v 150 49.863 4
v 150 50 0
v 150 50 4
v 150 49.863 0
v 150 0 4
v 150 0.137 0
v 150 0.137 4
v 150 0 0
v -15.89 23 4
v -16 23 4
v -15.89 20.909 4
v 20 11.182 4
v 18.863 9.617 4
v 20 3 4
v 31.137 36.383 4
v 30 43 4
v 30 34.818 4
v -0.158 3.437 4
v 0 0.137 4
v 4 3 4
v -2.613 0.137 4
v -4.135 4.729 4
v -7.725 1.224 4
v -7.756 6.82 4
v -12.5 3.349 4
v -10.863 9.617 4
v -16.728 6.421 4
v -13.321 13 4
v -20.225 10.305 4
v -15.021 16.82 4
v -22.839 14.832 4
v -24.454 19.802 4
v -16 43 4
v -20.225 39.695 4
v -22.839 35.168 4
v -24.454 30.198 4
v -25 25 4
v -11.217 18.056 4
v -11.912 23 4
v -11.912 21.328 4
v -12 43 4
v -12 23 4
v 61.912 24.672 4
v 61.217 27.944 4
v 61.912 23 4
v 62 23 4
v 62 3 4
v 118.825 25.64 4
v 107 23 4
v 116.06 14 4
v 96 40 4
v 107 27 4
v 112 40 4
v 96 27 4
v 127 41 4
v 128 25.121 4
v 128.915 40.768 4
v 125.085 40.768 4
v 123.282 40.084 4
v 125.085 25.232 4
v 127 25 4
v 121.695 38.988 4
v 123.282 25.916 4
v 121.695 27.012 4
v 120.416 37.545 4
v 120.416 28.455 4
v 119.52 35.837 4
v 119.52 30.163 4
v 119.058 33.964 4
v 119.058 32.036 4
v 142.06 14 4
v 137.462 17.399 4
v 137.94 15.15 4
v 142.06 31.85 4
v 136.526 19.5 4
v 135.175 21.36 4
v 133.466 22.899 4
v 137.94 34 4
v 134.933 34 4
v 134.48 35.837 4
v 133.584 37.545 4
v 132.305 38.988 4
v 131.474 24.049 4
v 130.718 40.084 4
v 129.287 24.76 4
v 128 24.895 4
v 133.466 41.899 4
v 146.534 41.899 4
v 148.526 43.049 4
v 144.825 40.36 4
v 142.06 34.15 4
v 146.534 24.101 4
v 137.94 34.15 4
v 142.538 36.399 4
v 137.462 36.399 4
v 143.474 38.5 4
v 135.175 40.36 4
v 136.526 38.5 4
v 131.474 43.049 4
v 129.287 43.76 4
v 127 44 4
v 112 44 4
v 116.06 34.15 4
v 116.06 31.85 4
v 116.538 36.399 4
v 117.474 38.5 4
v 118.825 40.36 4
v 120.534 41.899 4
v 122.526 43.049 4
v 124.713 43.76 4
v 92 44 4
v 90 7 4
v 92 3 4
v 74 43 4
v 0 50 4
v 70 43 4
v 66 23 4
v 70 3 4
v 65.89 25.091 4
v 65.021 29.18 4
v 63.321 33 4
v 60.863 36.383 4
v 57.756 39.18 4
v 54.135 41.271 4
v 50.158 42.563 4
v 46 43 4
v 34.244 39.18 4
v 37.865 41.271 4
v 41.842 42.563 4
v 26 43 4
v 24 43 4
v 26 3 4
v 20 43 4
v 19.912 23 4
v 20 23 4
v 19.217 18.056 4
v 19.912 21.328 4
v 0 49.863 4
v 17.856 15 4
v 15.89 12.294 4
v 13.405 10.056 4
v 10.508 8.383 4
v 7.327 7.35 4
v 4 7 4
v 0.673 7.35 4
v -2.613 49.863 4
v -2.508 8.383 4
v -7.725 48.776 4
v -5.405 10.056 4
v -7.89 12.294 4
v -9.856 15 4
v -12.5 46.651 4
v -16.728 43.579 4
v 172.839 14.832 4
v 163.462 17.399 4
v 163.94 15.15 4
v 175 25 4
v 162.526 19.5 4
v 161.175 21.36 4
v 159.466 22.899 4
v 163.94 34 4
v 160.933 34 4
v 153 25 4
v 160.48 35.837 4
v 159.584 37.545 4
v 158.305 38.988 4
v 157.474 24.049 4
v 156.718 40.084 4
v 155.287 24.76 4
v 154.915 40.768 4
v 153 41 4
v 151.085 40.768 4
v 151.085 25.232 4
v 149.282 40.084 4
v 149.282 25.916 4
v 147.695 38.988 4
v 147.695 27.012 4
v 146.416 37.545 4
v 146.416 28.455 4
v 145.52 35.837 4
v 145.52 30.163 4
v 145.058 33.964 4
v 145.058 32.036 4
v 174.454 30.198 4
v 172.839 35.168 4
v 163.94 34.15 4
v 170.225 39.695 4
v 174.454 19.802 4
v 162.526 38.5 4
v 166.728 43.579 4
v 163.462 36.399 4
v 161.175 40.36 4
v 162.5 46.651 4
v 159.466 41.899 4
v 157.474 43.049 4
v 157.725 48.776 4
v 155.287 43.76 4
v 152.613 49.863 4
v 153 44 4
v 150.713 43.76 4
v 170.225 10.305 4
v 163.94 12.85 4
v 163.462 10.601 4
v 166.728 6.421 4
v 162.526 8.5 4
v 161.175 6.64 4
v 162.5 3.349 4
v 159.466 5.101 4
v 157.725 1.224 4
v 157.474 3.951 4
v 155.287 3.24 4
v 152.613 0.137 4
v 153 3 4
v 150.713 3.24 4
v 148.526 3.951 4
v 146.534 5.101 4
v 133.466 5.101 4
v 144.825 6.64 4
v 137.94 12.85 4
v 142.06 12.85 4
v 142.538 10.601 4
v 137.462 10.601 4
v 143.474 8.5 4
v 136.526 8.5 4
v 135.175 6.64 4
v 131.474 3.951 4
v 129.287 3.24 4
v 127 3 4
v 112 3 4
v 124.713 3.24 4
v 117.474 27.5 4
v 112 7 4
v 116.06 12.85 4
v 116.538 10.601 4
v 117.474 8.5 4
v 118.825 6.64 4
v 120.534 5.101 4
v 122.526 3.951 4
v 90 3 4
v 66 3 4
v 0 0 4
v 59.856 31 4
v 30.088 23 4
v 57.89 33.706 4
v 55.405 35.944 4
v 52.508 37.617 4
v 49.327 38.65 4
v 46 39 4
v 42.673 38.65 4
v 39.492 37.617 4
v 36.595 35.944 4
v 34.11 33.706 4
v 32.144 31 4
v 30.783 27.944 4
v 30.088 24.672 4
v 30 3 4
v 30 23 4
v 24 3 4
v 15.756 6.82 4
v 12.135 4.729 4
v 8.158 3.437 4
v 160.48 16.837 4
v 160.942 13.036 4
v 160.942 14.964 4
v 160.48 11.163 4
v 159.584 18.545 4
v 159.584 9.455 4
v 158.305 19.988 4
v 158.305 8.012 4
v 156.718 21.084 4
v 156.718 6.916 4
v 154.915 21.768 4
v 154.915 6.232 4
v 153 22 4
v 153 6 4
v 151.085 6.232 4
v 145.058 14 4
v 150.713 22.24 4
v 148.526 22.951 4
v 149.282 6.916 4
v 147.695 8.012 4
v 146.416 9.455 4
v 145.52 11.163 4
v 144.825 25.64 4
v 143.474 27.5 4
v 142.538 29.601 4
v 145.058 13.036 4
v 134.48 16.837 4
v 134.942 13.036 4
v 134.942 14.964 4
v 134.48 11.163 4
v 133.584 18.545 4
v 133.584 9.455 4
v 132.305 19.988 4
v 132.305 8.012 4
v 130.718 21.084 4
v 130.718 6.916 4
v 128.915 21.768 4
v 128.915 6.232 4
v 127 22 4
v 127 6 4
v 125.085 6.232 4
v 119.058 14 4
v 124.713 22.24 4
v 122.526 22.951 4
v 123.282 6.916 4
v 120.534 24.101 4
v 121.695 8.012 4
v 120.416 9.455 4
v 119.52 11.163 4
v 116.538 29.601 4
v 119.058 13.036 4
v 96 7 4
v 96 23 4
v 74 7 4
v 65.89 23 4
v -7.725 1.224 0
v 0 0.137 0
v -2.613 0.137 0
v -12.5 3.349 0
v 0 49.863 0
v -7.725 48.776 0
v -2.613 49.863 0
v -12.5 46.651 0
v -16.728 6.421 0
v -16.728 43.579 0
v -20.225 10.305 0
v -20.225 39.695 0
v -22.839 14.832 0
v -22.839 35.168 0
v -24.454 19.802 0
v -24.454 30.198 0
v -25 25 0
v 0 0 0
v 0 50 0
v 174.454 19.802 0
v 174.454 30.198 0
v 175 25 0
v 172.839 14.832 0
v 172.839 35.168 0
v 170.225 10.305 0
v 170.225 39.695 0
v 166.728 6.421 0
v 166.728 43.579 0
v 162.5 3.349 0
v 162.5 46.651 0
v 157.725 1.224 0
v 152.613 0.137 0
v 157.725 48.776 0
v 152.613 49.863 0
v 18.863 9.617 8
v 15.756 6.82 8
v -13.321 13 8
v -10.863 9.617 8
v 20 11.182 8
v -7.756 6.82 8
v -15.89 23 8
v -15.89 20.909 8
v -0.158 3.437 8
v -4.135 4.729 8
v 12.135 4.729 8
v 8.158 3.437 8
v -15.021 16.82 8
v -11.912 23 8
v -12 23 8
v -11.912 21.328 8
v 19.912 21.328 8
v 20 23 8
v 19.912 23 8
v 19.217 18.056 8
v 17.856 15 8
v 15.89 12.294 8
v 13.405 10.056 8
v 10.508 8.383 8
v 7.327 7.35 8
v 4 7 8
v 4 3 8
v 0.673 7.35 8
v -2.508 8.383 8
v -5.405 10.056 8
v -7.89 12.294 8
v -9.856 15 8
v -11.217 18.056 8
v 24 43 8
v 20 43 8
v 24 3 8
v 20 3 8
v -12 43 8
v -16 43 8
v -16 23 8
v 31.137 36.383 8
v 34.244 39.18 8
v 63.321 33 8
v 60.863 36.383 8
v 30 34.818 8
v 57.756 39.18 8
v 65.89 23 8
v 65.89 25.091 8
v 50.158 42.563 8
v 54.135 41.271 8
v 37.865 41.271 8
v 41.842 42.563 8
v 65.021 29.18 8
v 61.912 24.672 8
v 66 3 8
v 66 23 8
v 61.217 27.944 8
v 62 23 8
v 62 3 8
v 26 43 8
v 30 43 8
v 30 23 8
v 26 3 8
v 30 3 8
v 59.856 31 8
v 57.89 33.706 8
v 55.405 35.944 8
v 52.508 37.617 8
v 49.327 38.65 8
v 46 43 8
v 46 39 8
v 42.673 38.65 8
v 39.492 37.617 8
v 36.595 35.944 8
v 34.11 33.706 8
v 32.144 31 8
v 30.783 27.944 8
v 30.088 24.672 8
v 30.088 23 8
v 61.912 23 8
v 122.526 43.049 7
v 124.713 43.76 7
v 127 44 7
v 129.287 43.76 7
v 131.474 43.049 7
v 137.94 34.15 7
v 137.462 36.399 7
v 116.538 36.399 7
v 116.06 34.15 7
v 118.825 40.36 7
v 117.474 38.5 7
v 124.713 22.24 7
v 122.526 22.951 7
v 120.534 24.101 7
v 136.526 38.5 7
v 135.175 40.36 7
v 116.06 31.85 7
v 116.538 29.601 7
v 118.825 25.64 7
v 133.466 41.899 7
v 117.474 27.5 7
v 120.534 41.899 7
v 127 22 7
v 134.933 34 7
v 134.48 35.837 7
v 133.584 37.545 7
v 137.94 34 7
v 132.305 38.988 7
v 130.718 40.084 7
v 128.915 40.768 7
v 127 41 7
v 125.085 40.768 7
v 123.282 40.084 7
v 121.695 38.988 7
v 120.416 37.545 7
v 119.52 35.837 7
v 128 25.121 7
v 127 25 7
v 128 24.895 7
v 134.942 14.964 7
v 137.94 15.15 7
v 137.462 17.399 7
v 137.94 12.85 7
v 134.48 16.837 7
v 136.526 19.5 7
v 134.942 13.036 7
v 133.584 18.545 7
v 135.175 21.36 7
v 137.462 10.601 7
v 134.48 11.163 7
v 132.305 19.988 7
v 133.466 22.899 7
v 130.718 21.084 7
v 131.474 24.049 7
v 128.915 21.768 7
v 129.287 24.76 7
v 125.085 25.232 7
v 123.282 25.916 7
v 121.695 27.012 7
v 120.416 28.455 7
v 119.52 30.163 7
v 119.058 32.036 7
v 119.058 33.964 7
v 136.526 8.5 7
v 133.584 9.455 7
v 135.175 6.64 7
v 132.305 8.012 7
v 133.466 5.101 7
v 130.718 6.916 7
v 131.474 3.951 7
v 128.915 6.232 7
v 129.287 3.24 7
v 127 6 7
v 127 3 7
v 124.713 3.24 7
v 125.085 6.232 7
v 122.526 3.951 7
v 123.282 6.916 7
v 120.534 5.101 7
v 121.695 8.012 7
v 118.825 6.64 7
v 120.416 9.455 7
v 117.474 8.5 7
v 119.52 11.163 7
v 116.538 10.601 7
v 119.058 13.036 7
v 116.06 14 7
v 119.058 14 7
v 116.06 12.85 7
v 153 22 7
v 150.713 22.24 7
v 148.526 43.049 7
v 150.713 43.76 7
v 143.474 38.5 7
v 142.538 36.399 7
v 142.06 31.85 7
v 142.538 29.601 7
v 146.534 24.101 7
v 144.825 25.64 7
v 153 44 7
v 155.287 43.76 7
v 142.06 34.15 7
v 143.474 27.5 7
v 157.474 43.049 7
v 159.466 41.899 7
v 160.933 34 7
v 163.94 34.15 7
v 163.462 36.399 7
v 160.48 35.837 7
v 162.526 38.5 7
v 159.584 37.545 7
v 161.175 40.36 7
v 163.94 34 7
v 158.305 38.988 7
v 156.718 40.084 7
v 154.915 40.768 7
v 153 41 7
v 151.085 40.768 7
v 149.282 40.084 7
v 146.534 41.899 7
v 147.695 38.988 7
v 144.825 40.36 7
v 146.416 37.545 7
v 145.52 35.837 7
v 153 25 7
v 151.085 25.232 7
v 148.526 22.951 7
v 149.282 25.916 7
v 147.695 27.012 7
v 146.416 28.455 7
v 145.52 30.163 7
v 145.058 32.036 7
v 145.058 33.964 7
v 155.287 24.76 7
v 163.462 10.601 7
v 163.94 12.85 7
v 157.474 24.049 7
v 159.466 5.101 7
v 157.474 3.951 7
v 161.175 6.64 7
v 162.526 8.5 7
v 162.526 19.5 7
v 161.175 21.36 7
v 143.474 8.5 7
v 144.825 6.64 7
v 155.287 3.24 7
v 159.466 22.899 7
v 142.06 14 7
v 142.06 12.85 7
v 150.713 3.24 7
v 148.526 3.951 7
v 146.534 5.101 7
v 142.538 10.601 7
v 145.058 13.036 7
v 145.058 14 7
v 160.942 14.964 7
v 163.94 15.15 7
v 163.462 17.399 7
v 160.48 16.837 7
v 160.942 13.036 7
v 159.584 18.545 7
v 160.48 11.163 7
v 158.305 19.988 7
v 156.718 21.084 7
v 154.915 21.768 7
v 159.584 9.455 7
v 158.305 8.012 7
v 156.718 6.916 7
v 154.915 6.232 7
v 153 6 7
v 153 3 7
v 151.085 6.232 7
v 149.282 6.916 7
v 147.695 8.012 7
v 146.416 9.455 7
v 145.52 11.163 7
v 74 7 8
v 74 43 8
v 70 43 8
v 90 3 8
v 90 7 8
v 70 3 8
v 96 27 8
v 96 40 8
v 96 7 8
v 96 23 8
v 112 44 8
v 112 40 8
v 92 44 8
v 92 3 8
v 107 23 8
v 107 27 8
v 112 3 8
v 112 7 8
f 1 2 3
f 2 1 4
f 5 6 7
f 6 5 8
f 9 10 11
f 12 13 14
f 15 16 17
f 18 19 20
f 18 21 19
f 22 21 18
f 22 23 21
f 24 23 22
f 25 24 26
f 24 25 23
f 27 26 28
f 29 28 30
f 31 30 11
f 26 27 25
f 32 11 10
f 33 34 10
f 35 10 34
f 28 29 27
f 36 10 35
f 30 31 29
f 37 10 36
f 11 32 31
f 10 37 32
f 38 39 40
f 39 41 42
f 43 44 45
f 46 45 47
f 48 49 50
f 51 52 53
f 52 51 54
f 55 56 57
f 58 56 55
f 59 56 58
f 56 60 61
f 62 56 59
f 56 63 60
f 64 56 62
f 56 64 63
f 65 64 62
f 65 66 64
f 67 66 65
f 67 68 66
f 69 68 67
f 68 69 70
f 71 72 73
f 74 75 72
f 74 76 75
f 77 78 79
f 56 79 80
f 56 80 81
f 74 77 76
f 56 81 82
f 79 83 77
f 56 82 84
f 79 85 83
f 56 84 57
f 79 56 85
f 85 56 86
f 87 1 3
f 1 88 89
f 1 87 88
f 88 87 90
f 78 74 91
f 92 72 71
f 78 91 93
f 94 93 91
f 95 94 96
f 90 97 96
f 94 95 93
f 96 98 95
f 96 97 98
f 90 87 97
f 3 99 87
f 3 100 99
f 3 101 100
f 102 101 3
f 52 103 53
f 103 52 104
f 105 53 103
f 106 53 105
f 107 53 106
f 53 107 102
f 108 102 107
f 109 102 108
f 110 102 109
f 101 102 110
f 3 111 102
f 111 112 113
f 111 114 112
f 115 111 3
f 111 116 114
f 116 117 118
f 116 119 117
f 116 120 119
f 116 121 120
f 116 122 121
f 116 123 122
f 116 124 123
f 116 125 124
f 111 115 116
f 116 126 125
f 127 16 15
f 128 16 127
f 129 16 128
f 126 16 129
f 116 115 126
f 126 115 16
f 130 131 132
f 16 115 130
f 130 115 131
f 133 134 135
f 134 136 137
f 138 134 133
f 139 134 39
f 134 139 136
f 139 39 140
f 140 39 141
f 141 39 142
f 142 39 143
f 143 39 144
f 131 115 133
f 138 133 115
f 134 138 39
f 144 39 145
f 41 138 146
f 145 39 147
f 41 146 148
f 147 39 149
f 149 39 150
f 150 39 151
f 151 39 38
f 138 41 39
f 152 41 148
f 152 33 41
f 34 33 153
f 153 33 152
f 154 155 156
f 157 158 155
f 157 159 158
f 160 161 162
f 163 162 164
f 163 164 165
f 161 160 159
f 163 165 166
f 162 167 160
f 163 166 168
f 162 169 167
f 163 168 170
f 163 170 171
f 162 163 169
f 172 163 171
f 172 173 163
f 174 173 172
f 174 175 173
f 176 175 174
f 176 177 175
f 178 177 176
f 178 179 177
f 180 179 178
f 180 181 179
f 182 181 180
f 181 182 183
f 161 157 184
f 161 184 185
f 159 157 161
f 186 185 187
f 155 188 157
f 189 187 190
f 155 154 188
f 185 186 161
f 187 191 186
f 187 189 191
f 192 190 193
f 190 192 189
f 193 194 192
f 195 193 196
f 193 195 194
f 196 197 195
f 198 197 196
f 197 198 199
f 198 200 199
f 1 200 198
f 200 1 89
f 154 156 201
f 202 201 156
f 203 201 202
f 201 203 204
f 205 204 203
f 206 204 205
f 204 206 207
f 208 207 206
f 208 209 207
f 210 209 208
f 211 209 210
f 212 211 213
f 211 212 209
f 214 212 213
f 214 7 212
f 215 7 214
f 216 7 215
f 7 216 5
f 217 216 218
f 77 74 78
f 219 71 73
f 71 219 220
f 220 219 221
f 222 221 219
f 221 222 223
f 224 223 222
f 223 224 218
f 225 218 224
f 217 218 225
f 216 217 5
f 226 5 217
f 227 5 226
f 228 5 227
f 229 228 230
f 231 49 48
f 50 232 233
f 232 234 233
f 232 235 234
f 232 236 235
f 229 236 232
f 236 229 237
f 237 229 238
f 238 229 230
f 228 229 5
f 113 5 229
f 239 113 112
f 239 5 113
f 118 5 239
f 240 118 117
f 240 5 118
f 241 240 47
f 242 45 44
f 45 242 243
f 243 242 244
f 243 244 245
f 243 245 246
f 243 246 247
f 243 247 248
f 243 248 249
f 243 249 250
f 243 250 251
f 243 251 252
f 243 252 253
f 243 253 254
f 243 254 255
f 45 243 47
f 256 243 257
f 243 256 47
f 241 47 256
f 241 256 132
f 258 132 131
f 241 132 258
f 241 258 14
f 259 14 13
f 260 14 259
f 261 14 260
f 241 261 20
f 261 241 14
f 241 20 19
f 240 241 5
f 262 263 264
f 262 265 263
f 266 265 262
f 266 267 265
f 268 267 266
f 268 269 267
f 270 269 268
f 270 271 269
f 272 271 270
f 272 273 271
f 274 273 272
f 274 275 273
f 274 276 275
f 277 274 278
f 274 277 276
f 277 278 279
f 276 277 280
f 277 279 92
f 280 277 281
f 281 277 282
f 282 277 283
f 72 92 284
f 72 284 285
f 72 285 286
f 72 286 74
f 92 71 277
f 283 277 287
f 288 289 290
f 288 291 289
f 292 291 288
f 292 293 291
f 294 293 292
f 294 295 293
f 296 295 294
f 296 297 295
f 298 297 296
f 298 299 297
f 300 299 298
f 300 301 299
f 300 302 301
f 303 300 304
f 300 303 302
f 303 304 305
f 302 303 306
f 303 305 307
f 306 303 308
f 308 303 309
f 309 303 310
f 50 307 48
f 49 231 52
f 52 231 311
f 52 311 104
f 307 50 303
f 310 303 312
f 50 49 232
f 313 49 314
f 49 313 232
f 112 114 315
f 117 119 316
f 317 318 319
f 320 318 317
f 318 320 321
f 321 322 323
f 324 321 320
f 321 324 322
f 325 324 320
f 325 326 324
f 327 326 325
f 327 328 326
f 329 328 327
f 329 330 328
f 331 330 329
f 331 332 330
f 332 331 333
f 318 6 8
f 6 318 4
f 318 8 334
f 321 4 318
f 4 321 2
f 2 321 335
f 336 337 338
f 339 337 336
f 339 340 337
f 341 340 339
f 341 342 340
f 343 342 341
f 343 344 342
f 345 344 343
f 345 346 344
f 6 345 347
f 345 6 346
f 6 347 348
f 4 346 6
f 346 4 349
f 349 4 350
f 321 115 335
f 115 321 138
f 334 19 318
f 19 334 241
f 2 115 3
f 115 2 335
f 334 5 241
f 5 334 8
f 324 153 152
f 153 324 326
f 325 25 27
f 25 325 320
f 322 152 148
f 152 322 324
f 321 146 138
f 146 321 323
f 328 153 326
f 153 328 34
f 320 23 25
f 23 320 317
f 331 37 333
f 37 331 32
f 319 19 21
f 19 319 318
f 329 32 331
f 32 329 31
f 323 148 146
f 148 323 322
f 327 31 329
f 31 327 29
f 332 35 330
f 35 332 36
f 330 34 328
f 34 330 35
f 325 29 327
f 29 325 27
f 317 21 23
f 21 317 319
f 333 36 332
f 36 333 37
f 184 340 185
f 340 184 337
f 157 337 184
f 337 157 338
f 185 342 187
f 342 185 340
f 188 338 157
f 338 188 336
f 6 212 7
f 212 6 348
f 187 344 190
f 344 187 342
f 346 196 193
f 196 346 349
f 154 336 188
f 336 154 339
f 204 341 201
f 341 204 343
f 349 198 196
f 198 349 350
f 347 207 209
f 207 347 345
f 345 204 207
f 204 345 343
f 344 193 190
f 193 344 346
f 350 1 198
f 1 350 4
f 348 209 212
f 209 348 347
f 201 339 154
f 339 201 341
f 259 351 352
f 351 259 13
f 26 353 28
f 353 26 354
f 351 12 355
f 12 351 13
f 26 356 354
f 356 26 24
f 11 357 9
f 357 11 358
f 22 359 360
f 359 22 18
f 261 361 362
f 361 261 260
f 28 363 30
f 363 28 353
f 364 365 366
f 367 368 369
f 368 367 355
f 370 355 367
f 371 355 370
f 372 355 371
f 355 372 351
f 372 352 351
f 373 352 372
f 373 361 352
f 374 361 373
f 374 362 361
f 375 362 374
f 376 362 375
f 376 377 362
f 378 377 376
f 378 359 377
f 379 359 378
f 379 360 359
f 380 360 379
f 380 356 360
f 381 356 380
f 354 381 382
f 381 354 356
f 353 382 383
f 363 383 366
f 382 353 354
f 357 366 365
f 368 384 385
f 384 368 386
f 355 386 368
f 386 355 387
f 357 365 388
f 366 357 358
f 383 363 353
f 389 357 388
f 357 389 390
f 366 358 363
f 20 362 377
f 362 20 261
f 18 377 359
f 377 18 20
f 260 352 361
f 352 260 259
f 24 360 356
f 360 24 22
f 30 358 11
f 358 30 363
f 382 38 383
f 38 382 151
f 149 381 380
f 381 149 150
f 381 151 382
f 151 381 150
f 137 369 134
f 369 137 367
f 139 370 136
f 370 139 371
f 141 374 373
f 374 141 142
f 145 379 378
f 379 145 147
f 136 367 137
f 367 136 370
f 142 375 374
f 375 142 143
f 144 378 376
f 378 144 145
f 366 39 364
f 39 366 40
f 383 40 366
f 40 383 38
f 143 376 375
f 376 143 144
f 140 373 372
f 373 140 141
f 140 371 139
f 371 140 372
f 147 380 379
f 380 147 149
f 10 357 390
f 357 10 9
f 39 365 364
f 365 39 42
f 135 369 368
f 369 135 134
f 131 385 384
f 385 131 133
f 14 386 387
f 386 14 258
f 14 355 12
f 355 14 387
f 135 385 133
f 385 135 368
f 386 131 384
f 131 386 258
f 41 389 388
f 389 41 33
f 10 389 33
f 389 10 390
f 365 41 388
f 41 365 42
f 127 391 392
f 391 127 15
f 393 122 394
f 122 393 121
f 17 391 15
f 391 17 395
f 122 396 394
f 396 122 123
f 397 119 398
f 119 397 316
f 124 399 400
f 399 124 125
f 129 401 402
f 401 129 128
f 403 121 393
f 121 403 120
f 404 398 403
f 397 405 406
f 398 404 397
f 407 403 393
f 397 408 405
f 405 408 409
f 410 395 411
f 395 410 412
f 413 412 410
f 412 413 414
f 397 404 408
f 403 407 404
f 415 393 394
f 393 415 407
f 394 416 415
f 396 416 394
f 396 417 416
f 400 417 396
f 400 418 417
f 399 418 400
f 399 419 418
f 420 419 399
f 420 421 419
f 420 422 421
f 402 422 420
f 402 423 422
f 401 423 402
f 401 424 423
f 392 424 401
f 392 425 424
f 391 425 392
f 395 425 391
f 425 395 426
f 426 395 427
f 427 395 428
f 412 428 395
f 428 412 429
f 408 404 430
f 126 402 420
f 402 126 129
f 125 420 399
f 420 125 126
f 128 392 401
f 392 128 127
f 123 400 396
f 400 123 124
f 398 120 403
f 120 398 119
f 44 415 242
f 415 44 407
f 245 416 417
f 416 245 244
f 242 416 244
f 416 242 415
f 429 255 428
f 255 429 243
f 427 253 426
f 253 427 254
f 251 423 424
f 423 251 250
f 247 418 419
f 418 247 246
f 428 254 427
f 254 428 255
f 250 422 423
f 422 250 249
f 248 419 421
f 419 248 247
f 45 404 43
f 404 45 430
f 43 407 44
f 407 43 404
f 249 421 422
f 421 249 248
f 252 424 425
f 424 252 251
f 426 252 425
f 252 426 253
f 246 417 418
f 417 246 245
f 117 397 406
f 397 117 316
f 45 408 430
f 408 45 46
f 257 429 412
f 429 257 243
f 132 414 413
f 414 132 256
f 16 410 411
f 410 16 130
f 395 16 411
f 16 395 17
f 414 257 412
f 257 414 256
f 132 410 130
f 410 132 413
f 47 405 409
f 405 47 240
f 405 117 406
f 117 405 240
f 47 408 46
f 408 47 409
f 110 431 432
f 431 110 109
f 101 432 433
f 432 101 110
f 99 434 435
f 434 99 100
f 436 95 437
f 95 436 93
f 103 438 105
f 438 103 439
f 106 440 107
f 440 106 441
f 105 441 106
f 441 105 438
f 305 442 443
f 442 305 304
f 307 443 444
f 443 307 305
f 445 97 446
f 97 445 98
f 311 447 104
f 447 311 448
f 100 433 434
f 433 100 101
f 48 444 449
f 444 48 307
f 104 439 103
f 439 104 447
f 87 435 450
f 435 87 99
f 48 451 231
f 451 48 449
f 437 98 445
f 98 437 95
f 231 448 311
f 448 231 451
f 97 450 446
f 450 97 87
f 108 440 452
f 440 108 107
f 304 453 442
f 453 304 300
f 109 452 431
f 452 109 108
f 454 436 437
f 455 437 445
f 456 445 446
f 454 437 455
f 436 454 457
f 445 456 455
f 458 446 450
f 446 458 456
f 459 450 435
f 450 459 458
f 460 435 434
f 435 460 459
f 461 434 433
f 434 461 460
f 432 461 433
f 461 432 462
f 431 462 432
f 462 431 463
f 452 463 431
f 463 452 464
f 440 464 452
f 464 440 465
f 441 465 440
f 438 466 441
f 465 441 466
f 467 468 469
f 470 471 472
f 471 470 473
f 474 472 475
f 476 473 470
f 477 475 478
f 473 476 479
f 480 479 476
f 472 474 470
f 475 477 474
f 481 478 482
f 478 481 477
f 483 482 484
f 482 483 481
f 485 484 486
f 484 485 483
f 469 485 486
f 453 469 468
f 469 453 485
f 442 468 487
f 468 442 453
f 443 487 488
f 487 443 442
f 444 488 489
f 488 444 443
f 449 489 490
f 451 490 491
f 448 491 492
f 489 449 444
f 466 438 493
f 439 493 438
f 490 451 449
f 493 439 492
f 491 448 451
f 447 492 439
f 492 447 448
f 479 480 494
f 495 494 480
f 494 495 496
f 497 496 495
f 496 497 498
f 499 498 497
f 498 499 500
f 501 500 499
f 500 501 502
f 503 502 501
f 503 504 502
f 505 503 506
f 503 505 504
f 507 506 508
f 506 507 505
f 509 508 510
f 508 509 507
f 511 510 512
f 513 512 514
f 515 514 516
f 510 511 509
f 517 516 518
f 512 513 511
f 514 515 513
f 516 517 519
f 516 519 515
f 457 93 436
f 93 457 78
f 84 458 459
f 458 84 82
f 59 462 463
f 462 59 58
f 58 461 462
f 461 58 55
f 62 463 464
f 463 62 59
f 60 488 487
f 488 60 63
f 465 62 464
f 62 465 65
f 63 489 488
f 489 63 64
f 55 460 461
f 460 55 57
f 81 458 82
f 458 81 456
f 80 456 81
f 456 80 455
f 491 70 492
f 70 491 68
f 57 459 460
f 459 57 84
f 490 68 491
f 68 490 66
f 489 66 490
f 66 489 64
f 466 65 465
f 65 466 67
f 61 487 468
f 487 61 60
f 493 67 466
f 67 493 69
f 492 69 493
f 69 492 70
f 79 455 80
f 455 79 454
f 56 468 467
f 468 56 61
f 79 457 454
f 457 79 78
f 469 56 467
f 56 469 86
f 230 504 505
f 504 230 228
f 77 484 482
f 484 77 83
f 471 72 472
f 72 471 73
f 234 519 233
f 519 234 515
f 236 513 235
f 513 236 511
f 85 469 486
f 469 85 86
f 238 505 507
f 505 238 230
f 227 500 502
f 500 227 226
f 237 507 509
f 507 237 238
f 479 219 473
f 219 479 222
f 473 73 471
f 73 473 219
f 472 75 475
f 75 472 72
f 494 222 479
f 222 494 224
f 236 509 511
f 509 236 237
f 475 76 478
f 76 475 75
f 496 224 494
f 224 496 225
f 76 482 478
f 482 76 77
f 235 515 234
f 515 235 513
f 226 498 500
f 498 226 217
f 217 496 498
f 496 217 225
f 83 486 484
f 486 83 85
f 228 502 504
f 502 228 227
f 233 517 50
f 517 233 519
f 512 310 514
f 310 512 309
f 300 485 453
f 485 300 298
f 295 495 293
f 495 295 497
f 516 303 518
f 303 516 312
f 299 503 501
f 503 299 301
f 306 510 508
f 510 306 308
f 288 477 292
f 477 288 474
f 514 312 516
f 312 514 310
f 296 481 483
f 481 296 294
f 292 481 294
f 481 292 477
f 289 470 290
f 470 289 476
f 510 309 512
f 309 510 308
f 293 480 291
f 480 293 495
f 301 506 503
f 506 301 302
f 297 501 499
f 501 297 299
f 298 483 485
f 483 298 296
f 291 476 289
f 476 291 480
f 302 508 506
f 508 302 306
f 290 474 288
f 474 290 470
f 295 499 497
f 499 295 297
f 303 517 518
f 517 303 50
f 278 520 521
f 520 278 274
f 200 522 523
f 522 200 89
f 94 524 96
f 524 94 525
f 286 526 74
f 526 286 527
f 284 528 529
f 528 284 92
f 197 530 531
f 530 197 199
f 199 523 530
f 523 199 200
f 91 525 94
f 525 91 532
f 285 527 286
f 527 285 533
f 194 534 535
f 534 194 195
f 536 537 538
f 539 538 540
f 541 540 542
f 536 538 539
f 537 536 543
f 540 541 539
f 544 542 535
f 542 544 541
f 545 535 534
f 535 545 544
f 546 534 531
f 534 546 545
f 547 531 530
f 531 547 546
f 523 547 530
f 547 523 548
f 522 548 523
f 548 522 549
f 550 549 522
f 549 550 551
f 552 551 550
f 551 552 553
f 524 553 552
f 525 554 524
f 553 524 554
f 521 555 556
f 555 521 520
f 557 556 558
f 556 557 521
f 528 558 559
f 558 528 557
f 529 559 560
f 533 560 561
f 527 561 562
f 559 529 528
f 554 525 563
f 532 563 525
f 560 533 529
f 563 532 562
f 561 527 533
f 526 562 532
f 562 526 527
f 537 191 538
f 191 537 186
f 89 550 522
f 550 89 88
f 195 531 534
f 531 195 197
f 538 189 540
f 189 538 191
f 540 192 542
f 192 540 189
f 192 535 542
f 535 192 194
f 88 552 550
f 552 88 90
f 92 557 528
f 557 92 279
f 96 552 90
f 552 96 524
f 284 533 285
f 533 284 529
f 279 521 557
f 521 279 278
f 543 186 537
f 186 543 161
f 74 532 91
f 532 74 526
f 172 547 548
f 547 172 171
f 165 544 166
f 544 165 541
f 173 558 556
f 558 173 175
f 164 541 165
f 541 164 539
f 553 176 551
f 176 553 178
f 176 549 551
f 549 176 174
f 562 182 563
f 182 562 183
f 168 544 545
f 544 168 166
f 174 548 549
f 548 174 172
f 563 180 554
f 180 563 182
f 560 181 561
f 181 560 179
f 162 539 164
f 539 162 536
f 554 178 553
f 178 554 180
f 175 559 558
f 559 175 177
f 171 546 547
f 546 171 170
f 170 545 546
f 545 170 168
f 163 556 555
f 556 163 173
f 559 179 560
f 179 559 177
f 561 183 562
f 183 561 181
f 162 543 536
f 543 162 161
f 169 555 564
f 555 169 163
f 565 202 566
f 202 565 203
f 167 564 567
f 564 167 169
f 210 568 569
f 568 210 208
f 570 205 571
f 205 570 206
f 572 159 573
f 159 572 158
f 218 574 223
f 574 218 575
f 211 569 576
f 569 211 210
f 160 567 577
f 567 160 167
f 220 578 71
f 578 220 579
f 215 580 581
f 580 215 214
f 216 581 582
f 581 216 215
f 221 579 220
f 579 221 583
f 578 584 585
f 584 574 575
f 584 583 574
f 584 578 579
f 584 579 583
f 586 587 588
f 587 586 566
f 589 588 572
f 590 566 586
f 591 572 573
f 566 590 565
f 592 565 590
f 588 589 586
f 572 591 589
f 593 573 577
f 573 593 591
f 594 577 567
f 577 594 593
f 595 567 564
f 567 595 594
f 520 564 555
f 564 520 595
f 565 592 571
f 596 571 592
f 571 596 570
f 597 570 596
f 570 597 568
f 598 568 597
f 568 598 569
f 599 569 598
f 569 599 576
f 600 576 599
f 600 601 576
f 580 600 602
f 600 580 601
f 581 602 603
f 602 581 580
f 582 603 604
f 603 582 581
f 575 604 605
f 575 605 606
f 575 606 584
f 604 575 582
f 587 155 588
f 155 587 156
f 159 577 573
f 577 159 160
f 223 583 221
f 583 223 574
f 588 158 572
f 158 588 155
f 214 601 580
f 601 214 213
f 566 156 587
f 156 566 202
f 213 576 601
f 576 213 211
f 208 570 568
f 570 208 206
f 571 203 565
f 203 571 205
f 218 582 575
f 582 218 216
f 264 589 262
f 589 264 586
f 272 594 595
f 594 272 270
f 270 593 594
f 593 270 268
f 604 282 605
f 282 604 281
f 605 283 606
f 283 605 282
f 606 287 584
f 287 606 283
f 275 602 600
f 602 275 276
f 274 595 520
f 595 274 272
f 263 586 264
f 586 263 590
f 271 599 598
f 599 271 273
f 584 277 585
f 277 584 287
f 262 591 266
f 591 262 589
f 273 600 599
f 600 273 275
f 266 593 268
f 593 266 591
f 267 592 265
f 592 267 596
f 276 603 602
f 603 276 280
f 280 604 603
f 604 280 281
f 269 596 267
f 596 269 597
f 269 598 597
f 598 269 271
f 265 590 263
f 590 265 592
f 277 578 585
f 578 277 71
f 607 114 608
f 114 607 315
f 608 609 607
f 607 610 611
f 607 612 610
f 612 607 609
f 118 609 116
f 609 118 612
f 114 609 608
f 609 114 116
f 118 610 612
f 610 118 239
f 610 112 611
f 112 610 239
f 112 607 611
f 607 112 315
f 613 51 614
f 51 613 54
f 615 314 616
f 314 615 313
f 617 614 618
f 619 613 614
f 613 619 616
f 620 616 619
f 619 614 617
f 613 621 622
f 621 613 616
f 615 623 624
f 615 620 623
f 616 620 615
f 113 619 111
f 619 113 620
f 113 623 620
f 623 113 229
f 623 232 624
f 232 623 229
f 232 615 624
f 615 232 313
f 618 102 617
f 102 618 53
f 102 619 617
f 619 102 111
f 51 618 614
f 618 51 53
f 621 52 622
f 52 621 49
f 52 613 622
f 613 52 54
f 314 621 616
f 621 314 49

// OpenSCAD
union(){  
  cube([150,50,4]);
  translate([0,25,0])
  cylinder(4,25,25);
  translate([150,25,0])
  cylinder(4,25,25);
  

}

//буква u
  rotate(90,0,0)
   translate([23,-4,4])
union(){
difference(){
 cylinder(4,20,20);
  cylinder(4,16,16);
   translate([0,-20,0]) cube(40);
}
  translate([-20,-20,0]) cube([40,4,4]);
  translate([0,16,0]) cube([20,4,4]);
}

  //буква n
  rotate(-90,0,0)
   translate([-23,46,4])

union(){
difference(){
cylinder(4,20,20);

cylinder(4,16,16);

translate([0,-20,0]) cube(40);
}
  translate([-20,-20,0]) cube([40,4,4]);
  translate([0,16,0]) cube([20,4,4]);
}
  //буква L
  translate([70,3,4]) cube([4,40,4]);
  translate([70,3,4]) cube([20,4,4]);
  
  //буква E
  translate([92,3,4]) cube([4,40,4]);
  translate([92,3,4]) cube([20,4,4]);
  translate([92,40,4]) cube([20,4,4]);
  translate([92,23,4]) cube([15,4,4]);

rotate(90,0,0)
translate([24,-33,4])
union(){

//буква S

difference(){
  translate([9,-94,0]) cylinder(3,11,11);
  translate([9,-94,0]) cylinder(3,8,8);
  translate([-5,-110,0]) cube(15);

}

difference(){
  translate([-10,-94,0]) cylinder(3,11,11);
  translate([-10,-94,0]) cylinder(3,8,8);
  translate([-10,-94,0]) cube(15);

}
difference(){
  translate([9,-120,0]) cylinder(3,11,11);
  translate([9,-120,0]) cylinder(3,8,8);
  translate([-5,-135,0]) cube(15);

}

difference(){
  translate([-10,-120,0]) cylinder(3,11,11);
  translate([-10,-120,0]) cylinder(3,8,8);
  translate([-10,-120,0]) cube(15);

}
}
